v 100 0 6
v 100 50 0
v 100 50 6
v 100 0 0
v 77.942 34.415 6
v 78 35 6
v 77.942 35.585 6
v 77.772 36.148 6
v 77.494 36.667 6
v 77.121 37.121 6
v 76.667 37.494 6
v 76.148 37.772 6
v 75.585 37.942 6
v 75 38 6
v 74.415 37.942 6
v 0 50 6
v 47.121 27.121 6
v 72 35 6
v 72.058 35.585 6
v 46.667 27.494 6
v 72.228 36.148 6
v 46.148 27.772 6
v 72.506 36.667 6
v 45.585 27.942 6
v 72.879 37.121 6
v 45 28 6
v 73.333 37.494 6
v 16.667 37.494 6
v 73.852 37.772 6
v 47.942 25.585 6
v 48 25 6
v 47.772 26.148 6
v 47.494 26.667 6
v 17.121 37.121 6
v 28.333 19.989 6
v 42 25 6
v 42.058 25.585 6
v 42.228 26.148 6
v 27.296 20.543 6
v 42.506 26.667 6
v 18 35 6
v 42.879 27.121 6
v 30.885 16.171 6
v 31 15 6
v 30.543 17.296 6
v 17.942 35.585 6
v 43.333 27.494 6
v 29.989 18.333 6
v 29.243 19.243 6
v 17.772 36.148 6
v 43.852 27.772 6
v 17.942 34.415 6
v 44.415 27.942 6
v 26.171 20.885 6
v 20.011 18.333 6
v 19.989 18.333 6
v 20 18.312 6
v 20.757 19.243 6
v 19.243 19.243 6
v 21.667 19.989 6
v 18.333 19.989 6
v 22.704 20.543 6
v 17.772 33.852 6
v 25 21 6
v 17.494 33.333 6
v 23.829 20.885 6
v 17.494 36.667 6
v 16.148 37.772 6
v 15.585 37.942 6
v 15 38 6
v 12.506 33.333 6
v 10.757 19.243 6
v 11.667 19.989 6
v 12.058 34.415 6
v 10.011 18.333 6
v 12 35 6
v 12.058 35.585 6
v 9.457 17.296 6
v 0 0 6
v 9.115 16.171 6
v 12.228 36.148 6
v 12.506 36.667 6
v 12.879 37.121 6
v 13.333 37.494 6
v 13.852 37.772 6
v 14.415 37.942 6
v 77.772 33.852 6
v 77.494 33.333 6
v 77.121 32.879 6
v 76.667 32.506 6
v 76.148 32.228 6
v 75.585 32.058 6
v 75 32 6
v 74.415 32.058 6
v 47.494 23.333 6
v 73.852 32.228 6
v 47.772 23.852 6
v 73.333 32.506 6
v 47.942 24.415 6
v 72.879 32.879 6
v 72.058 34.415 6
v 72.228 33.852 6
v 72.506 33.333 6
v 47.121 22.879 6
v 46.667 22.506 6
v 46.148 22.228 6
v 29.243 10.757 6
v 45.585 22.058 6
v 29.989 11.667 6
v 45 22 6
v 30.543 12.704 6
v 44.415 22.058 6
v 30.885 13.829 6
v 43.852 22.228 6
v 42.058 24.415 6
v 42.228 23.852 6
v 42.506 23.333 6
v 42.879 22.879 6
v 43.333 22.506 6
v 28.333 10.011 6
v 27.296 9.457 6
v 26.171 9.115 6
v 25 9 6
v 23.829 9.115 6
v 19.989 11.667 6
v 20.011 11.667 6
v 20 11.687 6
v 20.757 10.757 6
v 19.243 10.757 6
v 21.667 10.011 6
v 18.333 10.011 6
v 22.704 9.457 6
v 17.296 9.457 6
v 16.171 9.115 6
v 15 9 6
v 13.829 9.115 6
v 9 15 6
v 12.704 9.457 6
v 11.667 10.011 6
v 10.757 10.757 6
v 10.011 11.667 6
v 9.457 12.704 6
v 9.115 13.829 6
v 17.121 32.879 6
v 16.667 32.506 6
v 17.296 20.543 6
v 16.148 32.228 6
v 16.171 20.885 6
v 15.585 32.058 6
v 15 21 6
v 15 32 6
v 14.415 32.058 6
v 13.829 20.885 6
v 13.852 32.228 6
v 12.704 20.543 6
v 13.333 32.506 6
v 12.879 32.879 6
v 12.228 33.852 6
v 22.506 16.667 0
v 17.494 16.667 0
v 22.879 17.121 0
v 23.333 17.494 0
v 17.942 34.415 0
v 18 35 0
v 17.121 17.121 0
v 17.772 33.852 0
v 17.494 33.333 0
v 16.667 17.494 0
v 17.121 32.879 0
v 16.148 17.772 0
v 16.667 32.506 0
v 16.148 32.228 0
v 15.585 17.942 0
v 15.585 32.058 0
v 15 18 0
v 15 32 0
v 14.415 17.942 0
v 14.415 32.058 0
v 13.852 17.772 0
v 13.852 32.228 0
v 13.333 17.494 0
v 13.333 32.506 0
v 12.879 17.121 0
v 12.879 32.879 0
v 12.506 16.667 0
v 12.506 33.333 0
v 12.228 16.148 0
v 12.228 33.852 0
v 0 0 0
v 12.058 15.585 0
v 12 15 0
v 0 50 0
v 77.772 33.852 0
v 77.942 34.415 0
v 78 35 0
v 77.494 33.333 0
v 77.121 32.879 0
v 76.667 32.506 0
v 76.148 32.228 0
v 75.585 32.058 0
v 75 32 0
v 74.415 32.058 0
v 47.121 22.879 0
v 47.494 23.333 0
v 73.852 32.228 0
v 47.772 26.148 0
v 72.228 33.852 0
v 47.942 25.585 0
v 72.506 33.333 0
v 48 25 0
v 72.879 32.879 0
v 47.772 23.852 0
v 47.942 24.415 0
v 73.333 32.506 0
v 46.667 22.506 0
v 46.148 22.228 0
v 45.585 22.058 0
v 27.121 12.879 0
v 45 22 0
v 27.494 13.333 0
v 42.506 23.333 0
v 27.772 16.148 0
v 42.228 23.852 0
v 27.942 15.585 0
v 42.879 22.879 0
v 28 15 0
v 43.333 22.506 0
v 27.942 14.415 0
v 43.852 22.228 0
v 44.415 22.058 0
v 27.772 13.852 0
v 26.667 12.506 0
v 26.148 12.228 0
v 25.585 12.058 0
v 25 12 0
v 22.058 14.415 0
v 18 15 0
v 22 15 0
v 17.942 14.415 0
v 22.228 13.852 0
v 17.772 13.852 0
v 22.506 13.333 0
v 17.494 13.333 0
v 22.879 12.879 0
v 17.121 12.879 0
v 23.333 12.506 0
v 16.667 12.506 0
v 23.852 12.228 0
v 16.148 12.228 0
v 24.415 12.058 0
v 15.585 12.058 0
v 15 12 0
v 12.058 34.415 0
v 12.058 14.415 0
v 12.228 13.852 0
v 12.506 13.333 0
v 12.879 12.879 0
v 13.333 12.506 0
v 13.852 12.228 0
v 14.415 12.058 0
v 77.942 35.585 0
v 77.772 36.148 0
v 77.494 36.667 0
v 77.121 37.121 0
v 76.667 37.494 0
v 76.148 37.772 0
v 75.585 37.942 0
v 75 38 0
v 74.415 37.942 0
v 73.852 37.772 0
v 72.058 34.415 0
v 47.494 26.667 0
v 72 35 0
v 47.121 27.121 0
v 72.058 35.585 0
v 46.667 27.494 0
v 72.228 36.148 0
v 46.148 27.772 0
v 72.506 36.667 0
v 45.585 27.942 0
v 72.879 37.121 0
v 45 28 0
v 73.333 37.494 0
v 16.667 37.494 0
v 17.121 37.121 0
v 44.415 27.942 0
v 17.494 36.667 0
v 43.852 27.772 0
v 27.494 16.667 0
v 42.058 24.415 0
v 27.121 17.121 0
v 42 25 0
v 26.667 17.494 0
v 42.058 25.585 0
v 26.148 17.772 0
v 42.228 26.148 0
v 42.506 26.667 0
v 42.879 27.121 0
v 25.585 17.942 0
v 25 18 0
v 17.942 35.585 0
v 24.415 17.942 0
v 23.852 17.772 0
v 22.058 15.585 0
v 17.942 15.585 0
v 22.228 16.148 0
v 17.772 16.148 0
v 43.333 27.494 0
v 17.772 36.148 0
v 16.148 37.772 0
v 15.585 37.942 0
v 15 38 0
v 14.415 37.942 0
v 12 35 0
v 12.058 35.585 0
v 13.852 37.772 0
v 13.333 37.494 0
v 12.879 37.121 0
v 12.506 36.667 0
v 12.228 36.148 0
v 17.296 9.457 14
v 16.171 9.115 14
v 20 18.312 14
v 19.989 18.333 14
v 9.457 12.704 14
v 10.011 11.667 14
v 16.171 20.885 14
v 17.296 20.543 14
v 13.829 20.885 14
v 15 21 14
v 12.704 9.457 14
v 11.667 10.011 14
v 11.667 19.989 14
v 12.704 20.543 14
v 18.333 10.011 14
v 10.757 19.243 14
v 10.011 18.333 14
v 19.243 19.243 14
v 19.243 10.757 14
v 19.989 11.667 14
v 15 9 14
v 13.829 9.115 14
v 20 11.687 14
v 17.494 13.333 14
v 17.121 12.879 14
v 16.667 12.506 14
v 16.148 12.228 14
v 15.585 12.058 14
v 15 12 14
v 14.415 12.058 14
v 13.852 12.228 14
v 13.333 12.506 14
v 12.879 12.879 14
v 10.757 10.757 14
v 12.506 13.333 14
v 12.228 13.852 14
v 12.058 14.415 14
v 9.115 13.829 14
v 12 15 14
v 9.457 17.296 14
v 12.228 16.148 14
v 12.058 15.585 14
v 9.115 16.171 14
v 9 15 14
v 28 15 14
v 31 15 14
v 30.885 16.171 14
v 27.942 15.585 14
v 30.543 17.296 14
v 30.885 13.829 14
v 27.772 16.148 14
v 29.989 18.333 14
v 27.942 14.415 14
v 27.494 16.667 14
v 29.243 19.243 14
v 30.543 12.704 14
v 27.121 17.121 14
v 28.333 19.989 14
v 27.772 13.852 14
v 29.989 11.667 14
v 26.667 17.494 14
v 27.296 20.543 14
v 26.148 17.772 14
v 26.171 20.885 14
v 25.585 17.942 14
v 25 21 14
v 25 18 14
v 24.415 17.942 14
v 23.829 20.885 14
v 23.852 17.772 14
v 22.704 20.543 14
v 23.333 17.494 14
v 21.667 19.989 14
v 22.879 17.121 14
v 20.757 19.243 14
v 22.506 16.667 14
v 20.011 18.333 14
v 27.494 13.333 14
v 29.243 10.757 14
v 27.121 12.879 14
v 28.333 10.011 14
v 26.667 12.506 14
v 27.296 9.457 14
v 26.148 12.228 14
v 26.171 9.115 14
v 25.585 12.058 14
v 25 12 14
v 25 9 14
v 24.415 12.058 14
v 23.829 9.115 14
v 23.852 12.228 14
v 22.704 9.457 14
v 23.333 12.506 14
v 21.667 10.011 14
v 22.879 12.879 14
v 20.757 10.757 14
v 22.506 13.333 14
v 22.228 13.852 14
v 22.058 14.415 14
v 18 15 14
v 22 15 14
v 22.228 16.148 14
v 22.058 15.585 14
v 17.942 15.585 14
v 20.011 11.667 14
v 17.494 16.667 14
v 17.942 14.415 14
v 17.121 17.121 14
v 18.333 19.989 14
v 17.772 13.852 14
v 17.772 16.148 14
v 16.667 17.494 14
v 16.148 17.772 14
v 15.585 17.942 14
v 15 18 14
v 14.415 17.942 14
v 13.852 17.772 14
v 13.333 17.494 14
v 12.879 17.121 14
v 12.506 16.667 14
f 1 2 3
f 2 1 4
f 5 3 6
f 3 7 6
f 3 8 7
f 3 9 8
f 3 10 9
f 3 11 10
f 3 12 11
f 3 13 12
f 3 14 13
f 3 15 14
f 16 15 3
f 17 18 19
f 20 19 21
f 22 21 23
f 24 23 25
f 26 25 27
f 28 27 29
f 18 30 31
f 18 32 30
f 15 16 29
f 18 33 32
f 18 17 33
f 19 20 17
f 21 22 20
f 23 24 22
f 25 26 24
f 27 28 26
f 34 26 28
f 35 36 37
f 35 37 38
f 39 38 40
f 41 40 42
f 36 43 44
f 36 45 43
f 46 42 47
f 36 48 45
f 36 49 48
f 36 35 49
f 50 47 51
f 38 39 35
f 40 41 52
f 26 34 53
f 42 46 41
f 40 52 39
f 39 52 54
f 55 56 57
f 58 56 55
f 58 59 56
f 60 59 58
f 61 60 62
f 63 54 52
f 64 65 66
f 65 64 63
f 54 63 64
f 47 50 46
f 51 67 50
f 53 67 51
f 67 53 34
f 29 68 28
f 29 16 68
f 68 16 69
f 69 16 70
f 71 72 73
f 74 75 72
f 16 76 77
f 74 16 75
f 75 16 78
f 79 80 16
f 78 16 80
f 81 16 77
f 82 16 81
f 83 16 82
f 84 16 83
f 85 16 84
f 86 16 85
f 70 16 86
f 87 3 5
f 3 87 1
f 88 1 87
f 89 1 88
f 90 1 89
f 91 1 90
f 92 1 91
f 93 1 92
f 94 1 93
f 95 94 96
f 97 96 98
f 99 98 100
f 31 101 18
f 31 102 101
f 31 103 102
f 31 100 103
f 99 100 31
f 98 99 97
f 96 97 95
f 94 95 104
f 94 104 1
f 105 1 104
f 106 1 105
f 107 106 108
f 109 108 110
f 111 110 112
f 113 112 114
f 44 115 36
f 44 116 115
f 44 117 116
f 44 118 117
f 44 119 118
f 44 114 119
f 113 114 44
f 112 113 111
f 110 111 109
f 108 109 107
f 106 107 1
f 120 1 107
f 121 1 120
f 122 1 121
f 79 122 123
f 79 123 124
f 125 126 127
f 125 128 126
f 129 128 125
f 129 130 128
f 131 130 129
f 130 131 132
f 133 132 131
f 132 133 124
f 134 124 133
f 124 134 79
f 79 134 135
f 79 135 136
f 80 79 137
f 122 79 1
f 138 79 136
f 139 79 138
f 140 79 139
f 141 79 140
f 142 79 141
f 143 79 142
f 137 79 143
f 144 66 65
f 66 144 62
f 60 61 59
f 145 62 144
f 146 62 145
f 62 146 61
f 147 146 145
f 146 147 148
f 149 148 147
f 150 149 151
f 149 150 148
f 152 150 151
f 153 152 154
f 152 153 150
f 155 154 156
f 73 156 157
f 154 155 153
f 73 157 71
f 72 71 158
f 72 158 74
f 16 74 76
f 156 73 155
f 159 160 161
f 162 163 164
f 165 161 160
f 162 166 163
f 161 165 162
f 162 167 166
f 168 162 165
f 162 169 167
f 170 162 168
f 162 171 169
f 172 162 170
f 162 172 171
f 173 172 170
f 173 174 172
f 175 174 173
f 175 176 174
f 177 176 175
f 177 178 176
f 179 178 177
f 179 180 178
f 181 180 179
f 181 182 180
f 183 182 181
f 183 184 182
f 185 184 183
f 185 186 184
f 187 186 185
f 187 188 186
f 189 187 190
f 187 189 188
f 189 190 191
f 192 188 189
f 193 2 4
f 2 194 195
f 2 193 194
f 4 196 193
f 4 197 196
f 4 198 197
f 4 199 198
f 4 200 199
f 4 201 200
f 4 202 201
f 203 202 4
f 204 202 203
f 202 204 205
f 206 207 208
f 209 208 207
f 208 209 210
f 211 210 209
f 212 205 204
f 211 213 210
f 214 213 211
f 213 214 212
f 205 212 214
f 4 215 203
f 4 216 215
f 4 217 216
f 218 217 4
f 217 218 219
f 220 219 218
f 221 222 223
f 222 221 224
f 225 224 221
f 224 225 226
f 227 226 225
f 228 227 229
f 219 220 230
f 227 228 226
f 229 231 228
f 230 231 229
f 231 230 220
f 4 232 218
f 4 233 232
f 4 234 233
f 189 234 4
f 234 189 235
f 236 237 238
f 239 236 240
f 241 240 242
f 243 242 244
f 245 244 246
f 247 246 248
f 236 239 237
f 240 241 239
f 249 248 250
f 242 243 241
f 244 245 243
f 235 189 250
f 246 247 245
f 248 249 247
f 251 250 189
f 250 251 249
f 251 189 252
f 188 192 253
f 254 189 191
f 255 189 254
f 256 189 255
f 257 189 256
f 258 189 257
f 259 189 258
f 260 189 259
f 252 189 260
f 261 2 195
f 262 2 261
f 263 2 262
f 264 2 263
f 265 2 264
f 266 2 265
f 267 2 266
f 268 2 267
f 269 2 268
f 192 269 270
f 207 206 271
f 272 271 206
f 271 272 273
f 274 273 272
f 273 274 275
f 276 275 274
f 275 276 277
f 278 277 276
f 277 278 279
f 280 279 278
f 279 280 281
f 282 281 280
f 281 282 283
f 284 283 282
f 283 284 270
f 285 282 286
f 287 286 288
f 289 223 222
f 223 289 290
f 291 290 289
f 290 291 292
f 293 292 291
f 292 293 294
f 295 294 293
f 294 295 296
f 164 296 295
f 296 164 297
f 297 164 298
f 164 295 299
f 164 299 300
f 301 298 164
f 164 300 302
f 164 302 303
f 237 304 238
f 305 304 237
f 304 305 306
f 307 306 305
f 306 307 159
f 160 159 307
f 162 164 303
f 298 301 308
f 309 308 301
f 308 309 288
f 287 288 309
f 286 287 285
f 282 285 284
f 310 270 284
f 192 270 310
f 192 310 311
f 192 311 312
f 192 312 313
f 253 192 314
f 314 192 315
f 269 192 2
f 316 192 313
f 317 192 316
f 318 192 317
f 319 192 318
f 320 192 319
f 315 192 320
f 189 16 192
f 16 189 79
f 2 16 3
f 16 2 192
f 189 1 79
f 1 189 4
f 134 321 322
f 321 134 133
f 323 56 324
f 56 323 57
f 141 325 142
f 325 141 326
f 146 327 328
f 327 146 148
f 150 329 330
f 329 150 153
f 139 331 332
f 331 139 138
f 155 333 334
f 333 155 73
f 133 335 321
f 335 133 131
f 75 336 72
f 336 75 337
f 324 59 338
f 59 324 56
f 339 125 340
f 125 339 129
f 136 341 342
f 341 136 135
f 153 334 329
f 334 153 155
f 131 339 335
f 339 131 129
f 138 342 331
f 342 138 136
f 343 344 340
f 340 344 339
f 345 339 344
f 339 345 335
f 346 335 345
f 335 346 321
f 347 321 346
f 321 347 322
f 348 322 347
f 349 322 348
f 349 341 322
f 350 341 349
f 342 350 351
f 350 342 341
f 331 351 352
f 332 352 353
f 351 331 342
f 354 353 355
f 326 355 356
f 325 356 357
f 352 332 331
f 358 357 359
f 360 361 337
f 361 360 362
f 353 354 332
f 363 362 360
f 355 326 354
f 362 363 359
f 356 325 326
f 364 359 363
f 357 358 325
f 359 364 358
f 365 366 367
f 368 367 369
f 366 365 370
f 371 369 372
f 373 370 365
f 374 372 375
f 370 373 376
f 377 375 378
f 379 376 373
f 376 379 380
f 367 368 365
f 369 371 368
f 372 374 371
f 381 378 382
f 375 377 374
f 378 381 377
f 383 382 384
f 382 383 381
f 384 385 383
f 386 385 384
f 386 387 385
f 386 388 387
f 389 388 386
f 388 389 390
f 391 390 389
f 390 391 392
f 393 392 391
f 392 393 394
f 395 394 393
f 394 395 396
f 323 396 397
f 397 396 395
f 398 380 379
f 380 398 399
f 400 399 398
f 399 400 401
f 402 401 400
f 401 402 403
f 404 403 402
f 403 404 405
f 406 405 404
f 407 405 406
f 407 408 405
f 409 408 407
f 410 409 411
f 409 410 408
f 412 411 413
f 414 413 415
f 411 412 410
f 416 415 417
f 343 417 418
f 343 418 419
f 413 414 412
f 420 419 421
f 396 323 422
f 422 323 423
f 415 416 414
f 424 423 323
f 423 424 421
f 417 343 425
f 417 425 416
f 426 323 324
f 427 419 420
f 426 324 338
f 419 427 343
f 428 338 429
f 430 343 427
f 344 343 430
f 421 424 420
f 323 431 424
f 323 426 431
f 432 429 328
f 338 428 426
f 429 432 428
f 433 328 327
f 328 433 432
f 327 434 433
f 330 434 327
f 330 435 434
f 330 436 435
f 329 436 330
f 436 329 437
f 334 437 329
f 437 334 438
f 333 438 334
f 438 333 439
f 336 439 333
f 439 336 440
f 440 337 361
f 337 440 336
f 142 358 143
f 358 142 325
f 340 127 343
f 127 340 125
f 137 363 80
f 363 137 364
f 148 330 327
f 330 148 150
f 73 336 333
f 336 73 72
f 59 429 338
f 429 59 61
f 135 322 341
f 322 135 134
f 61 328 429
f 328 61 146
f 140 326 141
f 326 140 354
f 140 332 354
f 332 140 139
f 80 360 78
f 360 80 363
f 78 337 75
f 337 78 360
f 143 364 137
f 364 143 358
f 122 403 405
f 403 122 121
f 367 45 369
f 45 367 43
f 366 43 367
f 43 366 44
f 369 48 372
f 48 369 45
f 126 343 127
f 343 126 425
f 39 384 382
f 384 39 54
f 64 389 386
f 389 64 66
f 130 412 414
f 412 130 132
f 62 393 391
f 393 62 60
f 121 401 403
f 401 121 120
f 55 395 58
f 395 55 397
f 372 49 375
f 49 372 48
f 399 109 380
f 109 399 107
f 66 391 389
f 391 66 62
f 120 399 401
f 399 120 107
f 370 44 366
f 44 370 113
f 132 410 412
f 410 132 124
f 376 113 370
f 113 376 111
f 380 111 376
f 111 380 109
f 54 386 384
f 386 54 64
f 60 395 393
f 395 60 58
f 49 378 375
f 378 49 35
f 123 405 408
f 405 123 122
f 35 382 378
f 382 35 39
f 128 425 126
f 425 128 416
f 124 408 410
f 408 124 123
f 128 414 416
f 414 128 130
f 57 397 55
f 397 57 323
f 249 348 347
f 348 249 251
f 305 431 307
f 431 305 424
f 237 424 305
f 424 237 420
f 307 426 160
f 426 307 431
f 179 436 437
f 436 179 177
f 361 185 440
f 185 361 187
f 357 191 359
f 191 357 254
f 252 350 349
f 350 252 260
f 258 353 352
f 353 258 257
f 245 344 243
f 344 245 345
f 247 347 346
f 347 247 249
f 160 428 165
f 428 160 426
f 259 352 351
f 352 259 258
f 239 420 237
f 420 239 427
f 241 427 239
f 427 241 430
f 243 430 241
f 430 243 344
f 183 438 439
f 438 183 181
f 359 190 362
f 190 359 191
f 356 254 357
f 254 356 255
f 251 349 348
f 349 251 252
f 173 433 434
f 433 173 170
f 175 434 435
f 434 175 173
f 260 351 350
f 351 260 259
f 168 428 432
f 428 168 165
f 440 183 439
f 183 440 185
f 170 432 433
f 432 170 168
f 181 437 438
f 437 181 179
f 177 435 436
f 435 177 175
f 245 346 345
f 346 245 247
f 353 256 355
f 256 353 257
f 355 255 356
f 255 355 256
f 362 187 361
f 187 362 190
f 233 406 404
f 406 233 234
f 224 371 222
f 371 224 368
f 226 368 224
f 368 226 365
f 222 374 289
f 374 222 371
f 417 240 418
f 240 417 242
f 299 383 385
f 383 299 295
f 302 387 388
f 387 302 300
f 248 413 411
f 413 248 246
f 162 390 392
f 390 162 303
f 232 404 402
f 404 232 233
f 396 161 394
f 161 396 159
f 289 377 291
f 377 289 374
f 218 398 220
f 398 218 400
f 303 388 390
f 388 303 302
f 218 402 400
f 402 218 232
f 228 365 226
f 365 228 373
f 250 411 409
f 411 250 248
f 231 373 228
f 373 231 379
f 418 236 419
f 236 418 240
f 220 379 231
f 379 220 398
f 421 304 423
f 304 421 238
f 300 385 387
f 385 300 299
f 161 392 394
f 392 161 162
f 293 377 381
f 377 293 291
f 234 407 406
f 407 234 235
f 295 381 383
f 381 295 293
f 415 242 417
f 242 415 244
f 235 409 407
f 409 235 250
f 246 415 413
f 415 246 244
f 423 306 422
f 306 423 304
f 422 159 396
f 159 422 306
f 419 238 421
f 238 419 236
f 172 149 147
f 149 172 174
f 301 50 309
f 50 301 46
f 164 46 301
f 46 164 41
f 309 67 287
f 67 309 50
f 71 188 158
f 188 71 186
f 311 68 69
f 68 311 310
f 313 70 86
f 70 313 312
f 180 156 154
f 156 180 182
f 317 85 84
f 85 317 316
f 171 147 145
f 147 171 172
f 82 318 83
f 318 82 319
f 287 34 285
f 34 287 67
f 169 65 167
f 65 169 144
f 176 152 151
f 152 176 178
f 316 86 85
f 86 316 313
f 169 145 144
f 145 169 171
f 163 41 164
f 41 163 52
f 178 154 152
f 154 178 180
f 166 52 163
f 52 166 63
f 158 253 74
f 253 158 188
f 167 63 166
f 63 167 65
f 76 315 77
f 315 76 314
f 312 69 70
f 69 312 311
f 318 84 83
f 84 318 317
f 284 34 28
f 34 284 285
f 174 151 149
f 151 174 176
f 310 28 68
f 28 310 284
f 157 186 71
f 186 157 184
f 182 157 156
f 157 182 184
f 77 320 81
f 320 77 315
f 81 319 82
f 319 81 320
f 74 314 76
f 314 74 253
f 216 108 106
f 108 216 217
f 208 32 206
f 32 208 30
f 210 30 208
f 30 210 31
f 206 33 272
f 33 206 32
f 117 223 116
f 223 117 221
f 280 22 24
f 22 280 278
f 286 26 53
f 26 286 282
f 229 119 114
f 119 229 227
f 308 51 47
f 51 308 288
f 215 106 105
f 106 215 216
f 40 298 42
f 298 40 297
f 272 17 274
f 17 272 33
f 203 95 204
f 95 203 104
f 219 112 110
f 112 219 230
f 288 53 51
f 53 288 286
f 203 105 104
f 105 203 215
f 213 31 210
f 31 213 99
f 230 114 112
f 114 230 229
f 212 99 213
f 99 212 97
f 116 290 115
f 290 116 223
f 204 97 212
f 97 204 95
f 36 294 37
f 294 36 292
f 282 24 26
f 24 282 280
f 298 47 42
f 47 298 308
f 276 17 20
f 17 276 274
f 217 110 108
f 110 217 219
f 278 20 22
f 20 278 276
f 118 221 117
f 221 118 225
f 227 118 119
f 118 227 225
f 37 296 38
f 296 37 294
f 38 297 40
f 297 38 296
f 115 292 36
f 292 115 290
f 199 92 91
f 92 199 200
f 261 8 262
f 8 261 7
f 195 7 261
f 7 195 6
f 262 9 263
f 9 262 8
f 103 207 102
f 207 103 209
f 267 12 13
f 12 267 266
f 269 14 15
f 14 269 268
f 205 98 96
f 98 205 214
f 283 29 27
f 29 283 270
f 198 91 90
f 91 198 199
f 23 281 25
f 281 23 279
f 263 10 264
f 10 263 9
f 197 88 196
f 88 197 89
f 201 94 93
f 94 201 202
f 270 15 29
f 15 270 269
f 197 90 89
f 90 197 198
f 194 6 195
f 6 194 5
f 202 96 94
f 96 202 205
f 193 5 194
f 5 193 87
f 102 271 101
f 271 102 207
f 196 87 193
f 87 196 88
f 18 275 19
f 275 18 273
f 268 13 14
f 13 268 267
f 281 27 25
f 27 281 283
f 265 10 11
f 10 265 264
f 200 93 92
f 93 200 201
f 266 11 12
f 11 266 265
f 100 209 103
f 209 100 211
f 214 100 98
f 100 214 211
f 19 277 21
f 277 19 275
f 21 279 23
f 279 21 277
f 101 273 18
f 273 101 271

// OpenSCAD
$fn = 32;

// ----------------------------------------------------------------------
// Mixed field: bosses and holes at given coordinates
// ----------------------------------------------------------------------

// --- parameters (mm) ---
plate_l = 100;            // plate length, X
plate_w = 50;             // plate width, Y
plate_t = 6;              // plate thickness, Z
boss_d = 12;              // boss diameter
boss_h = 8;               // boss height above the plate
hole_d = 6;               // through hole diameter

total_h = plate_t + boss_h;  // overall height

difference() {
  union() {
    cube([plate_l, plate_w, plate_t]);
    translate([15, 15, plate_t]) cylinder(h = boss_h, d = boss_d);
    translate([25, 15, plate_t]) cylinder(h = boss_h, d = boss_d);
  }
  translate([15, 15, -1]) cylinder(h = total_h + 2, d = boss_d / 2);
  translate([25, 15, -1]) cylinder(h = total_h + 2, d = boss_d / 2);
  translate([15, 35, -1]) cylinder(h = plate_t + 2, d = hole_d);
  translate([45, 25, -1]) cylinder(h = plate_t + 2, d = hole_d);
  translate([75, 35, -1]) cylinder(h = plate_t + 2, d = hole_d);
}
